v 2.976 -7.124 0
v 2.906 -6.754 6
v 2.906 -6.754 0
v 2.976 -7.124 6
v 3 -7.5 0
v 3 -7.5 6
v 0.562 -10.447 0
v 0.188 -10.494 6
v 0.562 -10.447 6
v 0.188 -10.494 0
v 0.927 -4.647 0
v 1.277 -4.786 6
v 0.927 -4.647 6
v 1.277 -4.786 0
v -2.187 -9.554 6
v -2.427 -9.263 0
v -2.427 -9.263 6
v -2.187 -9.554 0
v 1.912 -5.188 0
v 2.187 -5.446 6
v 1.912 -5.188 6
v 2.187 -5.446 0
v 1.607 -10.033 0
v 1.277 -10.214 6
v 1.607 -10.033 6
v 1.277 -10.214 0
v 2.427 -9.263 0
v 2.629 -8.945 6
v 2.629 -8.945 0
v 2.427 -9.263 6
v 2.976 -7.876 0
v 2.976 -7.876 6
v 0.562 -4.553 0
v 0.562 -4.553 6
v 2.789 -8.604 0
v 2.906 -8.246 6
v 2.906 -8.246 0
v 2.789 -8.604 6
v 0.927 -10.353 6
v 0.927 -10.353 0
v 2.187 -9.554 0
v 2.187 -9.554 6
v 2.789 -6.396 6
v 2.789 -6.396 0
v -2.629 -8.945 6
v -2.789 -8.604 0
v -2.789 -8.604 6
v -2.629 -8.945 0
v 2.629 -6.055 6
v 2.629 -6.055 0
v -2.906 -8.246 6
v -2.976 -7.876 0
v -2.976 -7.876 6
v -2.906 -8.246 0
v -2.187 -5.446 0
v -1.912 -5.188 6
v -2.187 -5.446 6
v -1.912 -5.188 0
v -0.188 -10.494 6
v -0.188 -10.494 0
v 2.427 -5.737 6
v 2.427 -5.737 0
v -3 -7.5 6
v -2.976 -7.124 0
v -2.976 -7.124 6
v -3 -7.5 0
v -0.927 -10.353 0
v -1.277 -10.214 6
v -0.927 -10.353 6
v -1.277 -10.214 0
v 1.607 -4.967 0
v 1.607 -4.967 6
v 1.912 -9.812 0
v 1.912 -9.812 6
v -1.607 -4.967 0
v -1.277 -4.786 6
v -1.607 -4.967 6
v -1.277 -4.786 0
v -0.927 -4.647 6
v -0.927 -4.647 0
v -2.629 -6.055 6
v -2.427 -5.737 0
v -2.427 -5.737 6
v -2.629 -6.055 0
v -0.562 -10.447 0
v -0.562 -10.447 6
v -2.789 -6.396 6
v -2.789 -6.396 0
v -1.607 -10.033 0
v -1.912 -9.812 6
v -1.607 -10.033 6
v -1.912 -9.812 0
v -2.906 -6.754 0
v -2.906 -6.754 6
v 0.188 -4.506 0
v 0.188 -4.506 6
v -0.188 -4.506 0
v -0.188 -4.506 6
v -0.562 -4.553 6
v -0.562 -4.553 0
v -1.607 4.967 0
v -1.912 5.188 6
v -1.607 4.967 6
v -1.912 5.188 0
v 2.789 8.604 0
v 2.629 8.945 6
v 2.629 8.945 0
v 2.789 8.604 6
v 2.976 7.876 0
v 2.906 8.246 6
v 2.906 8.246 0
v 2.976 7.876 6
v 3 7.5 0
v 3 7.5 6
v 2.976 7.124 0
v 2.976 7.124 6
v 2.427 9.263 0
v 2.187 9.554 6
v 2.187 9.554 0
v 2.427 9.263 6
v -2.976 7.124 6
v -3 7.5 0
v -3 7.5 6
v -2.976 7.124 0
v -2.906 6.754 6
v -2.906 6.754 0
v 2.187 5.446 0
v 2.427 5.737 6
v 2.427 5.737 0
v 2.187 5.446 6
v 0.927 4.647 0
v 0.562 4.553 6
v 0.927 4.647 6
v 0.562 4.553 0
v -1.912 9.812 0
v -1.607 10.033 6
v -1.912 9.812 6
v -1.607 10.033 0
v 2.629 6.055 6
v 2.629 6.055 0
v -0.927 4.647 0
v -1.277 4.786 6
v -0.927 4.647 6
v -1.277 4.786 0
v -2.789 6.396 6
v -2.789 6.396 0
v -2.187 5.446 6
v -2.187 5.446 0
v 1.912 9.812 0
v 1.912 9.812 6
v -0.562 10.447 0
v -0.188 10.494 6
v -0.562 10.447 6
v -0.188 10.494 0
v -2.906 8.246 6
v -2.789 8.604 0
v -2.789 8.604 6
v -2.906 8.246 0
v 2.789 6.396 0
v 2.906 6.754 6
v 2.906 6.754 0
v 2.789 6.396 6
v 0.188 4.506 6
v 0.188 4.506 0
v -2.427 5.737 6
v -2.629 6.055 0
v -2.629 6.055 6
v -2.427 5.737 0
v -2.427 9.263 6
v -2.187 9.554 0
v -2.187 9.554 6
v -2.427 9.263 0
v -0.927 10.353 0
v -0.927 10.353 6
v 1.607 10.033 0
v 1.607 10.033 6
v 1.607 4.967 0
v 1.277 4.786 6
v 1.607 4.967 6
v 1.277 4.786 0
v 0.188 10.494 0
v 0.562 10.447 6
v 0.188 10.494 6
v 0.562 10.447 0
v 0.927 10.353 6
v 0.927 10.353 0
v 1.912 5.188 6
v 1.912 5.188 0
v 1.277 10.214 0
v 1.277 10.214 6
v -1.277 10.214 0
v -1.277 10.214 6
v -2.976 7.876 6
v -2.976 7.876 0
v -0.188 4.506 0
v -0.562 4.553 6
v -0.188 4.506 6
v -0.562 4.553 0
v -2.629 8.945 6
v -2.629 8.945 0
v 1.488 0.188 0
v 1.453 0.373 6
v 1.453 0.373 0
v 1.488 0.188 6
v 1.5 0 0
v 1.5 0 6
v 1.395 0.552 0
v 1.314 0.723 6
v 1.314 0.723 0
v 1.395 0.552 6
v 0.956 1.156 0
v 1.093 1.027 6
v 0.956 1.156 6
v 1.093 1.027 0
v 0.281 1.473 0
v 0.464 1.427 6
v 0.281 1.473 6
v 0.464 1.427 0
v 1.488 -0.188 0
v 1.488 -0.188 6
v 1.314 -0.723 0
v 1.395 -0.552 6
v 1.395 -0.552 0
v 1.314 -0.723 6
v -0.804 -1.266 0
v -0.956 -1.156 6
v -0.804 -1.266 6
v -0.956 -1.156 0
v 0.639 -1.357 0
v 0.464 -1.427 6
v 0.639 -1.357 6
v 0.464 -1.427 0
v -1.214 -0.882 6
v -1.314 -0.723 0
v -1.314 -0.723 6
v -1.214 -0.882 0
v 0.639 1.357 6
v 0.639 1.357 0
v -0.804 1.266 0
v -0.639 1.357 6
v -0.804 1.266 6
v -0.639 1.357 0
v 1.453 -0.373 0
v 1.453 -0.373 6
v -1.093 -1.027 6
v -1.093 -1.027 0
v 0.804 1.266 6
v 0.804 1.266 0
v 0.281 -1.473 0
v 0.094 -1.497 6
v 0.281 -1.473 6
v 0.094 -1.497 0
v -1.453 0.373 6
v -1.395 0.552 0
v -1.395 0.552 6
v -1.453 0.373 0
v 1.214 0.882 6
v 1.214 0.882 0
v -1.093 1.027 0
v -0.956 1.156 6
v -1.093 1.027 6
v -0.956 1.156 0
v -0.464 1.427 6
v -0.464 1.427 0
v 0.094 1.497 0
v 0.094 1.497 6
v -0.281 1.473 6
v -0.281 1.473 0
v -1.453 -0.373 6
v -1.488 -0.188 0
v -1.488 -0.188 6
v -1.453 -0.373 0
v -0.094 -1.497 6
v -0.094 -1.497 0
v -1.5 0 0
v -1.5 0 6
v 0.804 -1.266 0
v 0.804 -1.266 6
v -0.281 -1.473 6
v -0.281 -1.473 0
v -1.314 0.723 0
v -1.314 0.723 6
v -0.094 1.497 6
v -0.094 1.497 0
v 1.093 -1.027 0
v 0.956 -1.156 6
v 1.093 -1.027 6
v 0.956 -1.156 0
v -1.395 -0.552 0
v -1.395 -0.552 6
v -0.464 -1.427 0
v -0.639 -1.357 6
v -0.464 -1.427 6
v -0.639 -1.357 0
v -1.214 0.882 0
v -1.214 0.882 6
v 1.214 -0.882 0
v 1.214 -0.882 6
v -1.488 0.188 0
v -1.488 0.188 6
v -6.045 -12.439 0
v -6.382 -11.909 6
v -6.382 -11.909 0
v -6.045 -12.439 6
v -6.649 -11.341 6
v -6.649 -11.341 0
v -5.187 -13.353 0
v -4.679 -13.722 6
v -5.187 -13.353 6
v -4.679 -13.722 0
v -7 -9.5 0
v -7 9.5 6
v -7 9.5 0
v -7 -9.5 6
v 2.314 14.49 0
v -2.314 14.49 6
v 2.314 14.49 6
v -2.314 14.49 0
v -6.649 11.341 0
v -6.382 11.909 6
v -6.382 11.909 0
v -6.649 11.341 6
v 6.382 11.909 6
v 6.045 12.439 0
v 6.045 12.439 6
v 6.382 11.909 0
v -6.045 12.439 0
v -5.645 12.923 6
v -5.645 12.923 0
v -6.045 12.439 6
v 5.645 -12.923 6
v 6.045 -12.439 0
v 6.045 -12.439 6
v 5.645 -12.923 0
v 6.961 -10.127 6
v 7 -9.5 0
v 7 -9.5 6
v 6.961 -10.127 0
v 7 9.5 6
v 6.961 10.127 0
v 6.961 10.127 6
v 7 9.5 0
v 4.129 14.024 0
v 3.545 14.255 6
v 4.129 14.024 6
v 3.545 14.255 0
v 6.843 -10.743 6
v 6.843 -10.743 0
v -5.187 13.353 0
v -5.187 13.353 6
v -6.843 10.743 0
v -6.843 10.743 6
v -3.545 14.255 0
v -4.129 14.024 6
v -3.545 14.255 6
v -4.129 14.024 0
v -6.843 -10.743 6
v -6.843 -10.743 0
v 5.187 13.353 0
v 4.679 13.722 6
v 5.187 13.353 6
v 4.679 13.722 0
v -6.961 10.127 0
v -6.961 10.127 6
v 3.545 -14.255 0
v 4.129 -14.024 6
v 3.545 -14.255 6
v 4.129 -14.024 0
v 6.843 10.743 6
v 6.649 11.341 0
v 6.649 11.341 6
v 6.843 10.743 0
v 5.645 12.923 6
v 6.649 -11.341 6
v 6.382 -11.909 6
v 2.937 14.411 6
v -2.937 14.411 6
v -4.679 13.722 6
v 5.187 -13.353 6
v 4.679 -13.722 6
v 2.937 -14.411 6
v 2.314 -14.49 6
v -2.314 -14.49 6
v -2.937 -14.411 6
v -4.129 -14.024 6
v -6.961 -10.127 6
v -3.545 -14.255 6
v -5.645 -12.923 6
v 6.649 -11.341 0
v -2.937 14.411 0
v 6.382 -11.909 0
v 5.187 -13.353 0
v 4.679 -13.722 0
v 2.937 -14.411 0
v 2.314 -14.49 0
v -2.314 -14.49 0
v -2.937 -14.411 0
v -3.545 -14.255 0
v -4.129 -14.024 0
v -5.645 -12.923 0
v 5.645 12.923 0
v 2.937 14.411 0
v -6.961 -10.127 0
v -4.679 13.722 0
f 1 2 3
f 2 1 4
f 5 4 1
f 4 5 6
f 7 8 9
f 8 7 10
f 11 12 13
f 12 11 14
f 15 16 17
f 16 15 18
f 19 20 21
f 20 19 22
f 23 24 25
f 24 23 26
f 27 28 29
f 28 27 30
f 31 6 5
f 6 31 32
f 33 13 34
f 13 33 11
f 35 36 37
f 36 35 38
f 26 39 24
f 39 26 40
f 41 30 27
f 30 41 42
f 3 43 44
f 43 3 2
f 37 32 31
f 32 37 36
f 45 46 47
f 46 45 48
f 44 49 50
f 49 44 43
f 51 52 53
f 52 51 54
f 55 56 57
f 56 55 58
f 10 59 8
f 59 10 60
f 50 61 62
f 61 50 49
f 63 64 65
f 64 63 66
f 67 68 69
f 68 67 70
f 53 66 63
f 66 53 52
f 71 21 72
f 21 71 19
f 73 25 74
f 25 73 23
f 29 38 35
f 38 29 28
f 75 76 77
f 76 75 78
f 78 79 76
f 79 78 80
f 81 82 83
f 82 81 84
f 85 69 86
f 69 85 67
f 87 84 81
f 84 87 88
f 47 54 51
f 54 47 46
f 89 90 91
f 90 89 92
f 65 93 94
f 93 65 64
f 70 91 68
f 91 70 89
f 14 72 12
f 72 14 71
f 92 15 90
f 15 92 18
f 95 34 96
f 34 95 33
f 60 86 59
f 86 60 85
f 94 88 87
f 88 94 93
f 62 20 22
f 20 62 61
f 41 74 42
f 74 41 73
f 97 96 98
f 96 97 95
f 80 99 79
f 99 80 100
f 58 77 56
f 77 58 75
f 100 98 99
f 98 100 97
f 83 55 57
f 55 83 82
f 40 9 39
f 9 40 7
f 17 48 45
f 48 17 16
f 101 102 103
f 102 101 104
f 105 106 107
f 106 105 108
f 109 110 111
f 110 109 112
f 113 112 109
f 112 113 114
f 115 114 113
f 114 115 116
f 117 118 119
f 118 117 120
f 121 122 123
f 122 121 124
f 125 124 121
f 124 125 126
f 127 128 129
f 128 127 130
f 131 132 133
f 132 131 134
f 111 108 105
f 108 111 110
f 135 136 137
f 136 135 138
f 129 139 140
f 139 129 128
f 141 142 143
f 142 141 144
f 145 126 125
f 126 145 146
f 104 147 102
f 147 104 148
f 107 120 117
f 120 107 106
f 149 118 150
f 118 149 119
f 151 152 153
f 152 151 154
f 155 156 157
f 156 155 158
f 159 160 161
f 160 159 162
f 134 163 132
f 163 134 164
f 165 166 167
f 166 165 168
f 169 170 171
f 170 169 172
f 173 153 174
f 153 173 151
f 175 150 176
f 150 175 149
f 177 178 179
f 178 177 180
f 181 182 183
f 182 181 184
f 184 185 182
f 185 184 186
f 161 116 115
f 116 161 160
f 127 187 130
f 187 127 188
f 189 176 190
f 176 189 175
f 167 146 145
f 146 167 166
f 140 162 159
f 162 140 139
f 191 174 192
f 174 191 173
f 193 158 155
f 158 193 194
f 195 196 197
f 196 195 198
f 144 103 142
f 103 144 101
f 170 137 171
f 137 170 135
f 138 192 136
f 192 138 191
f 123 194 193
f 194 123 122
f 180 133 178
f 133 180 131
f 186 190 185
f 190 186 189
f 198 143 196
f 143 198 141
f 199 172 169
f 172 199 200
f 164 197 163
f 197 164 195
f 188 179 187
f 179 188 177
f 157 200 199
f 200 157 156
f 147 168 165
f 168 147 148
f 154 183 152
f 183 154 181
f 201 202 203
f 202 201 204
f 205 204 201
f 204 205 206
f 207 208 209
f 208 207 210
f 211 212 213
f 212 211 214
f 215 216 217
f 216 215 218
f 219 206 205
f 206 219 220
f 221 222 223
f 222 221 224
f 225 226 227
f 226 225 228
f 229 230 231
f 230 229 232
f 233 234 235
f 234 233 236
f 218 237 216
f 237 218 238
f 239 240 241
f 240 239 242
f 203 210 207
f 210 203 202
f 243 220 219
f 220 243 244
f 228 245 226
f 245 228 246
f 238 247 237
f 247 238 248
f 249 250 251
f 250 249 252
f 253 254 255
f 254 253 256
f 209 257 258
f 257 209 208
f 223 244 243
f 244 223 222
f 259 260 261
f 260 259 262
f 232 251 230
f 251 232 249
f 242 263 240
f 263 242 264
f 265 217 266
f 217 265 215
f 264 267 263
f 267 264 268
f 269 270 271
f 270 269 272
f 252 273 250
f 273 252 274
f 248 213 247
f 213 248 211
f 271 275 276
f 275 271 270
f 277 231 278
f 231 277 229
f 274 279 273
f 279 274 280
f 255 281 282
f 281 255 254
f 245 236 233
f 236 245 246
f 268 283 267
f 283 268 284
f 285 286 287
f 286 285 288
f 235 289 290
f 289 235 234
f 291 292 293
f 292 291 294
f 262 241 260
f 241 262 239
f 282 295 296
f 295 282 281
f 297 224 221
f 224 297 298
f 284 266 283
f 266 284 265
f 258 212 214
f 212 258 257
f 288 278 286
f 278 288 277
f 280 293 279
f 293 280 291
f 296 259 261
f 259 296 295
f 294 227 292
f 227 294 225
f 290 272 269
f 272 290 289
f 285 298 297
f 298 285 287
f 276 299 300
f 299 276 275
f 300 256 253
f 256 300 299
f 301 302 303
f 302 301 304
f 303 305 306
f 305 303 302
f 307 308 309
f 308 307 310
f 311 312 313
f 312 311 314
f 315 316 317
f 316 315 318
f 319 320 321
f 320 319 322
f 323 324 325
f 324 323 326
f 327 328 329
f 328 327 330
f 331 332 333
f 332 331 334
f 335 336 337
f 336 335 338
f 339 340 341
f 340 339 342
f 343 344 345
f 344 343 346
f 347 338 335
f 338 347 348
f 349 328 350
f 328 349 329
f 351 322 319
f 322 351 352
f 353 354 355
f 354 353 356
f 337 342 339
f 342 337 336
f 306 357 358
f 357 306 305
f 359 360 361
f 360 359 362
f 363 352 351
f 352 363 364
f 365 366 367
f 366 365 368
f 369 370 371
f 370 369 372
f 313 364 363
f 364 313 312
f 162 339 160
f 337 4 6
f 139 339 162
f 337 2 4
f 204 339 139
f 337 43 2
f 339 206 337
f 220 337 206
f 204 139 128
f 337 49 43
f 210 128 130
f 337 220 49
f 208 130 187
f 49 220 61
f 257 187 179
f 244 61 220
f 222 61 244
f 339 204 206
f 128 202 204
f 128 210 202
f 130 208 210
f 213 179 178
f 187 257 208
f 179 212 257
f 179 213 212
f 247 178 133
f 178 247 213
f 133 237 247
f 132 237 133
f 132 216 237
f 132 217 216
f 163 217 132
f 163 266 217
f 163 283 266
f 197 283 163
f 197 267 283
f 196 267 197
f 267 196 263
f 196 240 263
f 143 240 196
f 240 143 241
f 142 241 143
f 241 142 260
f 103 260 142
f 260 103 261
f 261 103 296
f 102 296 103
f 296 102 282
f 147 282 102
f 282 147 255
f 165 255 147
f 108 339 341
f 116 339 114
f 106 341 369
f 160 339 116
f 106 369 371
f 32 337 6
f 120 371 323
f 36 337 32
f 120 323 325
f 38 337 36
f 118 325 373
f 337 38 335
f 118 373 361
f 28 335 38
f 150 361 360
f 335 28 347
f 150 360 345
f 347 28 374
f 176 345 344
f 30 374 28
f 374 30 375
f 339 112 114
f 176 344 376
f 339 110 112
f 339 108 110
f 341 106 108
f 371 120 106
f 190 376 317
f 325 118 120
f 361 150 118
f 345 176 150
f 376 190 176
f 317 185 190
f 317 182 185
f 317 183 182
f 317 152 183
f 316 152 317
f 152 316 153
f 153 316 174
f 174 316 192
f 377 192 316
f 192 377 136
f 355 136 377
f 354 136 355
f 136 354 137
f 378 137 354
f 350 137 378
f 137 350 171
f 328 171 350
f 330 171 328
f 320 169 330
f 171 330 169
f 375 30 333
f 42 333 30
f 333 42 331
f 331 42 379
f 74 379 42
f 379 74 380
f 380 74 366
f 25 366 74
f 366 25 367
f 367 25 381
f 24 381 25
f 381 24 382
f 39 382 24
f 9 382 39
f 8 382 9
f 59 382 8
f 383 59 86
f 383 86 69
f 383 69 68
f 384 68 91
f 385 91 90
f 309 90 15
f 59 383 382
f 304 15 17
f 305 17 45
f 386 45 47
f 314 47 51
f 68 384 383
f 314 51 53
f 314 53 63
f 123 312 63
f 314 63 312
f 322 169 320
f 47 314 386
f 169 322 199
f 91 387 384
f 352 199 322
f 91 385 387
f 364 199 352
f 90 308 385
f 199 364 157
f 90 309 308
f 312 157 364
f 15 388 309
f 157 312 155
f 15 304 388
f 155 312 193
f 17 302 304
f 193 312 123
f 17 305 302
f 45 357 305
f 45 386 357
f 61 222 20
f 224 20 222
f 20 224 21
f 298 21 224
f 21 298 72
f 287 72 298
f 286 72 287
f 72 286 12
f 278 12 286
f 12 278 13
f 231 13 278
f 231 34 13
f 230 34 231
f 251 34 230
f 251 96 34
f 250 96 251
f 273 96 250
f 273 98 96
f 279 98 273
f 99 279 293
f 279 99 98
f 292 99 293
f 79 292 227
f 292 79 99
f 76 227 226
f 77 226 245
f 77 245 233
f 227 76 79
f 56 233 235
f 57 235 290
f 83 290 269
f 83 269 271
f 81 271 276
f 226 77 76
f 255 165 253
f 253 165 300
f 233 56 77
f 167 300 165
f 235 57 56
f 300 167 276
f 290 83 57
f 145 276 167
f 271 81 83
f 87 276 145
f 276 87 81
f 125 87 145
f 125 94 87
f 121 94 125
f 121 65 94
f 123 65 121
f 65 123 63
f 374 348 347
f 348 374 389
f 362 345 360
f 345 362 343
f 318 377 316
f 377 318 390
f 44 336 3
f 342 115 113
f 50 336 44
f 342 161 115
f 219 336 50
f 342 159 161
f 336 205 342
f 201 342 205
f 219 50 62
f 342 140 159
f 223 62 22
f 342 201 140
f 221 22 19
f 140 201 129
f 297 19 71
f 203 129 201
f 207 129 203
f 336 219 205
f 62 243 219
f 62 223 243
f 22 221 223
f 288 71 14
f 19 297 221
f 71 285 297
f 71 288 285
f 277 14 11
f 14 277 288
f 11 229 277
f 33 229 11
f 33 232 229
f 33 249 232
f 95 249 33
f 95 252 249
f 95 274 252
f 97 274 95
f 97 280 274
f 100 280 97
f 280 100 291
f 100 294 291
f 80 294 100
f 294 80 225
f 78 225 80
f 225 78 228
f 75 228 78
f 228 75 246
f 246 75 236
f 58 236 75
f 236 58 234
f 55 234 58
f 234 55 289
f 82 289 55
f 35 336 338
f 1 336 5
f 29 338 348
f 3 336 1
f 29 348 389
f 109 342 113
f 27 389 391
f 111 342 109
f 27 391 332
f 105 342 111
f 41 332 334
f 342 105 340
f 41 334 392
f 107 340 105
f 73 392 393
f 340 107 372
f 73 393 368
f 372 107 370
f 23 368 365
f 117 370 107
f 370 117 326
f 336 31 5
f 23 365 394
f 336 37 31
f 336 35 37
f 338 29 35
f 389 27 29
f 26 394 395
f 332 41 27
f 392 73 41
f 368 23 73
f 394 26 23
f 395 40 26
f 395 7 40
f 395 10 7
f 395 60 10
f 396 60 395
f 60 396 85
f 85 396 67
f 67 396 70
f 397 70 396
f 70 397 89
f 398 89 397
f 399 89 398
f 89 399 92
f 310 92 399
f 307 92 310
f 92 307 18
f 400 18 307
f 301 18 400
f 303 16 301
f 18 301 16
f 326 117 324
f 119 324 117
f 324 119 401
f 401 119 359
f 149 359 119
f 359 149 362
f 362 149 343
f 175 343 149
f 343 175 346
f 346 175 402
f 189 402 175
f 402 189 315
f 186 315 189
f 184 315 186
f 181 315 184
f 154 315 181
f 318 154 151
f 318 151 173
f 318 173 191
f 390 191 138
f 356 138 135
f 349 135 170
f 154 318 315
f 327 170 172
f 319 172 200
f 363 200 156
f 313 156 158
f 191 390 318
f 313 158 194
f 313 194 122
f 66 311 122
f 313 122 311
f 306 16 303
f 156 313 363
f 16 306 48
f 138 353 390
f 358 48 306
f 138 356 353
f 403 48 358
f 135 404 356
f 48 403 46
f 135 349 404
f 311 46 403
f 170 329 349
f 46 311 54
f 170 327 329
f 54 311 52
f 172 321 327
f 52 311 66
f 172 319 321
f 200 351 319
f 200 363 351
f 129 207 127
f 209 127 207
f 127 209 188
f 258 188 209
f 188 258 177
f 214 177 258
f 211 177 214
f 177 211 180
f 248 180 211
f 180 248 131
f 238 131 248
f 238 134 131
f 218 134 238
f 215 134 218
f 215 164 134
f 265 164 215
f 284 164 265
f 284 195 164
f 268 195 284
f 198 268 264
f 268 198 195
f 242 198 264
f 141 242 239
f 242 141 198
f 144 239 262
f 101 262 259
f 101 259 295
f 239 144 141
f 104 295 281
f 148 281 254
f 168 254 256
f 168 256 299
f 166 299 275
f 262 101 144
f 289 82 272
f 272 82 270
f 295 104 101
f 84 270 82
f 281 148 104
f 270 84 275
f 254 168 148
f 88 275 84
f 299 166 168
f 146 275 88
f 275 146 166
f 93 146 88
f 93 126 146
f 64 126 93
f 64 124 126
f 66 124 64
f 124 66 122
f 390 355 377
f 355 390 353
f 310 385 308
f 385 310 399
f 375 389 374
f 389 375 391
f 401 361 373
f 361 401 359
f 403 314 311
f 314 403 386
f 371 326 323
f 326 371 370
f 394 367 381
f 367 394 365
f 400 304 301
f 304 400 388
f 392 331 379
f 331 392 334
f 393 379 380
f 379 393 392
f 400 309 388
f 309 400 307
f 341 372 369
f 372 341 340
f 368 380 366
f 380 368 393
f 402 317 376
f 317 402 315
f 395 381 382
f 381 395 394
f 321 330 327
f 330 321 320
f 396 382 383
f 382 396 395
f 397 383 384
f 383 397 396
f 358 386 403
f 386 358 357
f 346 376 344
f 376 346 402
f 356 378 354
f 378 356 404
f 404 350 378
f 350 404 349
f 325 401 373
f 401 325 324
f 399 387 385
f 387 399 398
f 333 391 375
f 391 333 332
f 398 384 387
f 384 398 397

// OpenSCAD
$fn = 50;

difference() {
	union() {
		hull() {
			translate(v = [-2.0, 9.5, 0]) {
				cylinder(h = 6, r = 5);
			}
			translate(v = [2.0, 9.5, 0]) {
				cylinder(h = 6, r = 5);
			}
			translate(v = [-2.0, -9.5, 0]) {
				cylinder(h = 6, r = 5);
			}
			translate(v = [2.0, -9.5, 0]) {
				cylinder(h = 6, r = 5);
			}
		}
	}
	union() {
		translate(v = [0.0, -7.5, 0]) {
			translate(v = [0, 0, -100]) {
				cylinder(h = 200, r = 3.0);
			}
		}
		translate(v = [0.0, 7.5, 0]) {
			translate(v = [0, 0, -100]) {
				cylinder(h = 200, r = 3.0);
			}
		}
		translate(v = [0.0, -7.5, 0]) {
			translate(v = [0, 0, -100]) {
				cylinder(h = 200, r = 1.5);
			}
		}
		translate(v = [0, 0, -100]) {
			cylinder(h = 200, r = 1.5);
		}
		translate(v = [0.0, 7.5, 0]) {
			translate(v = [0, 0, -100]) {
				cylinder(h = 200, r = 1.5);
			}
		}
	}
}
